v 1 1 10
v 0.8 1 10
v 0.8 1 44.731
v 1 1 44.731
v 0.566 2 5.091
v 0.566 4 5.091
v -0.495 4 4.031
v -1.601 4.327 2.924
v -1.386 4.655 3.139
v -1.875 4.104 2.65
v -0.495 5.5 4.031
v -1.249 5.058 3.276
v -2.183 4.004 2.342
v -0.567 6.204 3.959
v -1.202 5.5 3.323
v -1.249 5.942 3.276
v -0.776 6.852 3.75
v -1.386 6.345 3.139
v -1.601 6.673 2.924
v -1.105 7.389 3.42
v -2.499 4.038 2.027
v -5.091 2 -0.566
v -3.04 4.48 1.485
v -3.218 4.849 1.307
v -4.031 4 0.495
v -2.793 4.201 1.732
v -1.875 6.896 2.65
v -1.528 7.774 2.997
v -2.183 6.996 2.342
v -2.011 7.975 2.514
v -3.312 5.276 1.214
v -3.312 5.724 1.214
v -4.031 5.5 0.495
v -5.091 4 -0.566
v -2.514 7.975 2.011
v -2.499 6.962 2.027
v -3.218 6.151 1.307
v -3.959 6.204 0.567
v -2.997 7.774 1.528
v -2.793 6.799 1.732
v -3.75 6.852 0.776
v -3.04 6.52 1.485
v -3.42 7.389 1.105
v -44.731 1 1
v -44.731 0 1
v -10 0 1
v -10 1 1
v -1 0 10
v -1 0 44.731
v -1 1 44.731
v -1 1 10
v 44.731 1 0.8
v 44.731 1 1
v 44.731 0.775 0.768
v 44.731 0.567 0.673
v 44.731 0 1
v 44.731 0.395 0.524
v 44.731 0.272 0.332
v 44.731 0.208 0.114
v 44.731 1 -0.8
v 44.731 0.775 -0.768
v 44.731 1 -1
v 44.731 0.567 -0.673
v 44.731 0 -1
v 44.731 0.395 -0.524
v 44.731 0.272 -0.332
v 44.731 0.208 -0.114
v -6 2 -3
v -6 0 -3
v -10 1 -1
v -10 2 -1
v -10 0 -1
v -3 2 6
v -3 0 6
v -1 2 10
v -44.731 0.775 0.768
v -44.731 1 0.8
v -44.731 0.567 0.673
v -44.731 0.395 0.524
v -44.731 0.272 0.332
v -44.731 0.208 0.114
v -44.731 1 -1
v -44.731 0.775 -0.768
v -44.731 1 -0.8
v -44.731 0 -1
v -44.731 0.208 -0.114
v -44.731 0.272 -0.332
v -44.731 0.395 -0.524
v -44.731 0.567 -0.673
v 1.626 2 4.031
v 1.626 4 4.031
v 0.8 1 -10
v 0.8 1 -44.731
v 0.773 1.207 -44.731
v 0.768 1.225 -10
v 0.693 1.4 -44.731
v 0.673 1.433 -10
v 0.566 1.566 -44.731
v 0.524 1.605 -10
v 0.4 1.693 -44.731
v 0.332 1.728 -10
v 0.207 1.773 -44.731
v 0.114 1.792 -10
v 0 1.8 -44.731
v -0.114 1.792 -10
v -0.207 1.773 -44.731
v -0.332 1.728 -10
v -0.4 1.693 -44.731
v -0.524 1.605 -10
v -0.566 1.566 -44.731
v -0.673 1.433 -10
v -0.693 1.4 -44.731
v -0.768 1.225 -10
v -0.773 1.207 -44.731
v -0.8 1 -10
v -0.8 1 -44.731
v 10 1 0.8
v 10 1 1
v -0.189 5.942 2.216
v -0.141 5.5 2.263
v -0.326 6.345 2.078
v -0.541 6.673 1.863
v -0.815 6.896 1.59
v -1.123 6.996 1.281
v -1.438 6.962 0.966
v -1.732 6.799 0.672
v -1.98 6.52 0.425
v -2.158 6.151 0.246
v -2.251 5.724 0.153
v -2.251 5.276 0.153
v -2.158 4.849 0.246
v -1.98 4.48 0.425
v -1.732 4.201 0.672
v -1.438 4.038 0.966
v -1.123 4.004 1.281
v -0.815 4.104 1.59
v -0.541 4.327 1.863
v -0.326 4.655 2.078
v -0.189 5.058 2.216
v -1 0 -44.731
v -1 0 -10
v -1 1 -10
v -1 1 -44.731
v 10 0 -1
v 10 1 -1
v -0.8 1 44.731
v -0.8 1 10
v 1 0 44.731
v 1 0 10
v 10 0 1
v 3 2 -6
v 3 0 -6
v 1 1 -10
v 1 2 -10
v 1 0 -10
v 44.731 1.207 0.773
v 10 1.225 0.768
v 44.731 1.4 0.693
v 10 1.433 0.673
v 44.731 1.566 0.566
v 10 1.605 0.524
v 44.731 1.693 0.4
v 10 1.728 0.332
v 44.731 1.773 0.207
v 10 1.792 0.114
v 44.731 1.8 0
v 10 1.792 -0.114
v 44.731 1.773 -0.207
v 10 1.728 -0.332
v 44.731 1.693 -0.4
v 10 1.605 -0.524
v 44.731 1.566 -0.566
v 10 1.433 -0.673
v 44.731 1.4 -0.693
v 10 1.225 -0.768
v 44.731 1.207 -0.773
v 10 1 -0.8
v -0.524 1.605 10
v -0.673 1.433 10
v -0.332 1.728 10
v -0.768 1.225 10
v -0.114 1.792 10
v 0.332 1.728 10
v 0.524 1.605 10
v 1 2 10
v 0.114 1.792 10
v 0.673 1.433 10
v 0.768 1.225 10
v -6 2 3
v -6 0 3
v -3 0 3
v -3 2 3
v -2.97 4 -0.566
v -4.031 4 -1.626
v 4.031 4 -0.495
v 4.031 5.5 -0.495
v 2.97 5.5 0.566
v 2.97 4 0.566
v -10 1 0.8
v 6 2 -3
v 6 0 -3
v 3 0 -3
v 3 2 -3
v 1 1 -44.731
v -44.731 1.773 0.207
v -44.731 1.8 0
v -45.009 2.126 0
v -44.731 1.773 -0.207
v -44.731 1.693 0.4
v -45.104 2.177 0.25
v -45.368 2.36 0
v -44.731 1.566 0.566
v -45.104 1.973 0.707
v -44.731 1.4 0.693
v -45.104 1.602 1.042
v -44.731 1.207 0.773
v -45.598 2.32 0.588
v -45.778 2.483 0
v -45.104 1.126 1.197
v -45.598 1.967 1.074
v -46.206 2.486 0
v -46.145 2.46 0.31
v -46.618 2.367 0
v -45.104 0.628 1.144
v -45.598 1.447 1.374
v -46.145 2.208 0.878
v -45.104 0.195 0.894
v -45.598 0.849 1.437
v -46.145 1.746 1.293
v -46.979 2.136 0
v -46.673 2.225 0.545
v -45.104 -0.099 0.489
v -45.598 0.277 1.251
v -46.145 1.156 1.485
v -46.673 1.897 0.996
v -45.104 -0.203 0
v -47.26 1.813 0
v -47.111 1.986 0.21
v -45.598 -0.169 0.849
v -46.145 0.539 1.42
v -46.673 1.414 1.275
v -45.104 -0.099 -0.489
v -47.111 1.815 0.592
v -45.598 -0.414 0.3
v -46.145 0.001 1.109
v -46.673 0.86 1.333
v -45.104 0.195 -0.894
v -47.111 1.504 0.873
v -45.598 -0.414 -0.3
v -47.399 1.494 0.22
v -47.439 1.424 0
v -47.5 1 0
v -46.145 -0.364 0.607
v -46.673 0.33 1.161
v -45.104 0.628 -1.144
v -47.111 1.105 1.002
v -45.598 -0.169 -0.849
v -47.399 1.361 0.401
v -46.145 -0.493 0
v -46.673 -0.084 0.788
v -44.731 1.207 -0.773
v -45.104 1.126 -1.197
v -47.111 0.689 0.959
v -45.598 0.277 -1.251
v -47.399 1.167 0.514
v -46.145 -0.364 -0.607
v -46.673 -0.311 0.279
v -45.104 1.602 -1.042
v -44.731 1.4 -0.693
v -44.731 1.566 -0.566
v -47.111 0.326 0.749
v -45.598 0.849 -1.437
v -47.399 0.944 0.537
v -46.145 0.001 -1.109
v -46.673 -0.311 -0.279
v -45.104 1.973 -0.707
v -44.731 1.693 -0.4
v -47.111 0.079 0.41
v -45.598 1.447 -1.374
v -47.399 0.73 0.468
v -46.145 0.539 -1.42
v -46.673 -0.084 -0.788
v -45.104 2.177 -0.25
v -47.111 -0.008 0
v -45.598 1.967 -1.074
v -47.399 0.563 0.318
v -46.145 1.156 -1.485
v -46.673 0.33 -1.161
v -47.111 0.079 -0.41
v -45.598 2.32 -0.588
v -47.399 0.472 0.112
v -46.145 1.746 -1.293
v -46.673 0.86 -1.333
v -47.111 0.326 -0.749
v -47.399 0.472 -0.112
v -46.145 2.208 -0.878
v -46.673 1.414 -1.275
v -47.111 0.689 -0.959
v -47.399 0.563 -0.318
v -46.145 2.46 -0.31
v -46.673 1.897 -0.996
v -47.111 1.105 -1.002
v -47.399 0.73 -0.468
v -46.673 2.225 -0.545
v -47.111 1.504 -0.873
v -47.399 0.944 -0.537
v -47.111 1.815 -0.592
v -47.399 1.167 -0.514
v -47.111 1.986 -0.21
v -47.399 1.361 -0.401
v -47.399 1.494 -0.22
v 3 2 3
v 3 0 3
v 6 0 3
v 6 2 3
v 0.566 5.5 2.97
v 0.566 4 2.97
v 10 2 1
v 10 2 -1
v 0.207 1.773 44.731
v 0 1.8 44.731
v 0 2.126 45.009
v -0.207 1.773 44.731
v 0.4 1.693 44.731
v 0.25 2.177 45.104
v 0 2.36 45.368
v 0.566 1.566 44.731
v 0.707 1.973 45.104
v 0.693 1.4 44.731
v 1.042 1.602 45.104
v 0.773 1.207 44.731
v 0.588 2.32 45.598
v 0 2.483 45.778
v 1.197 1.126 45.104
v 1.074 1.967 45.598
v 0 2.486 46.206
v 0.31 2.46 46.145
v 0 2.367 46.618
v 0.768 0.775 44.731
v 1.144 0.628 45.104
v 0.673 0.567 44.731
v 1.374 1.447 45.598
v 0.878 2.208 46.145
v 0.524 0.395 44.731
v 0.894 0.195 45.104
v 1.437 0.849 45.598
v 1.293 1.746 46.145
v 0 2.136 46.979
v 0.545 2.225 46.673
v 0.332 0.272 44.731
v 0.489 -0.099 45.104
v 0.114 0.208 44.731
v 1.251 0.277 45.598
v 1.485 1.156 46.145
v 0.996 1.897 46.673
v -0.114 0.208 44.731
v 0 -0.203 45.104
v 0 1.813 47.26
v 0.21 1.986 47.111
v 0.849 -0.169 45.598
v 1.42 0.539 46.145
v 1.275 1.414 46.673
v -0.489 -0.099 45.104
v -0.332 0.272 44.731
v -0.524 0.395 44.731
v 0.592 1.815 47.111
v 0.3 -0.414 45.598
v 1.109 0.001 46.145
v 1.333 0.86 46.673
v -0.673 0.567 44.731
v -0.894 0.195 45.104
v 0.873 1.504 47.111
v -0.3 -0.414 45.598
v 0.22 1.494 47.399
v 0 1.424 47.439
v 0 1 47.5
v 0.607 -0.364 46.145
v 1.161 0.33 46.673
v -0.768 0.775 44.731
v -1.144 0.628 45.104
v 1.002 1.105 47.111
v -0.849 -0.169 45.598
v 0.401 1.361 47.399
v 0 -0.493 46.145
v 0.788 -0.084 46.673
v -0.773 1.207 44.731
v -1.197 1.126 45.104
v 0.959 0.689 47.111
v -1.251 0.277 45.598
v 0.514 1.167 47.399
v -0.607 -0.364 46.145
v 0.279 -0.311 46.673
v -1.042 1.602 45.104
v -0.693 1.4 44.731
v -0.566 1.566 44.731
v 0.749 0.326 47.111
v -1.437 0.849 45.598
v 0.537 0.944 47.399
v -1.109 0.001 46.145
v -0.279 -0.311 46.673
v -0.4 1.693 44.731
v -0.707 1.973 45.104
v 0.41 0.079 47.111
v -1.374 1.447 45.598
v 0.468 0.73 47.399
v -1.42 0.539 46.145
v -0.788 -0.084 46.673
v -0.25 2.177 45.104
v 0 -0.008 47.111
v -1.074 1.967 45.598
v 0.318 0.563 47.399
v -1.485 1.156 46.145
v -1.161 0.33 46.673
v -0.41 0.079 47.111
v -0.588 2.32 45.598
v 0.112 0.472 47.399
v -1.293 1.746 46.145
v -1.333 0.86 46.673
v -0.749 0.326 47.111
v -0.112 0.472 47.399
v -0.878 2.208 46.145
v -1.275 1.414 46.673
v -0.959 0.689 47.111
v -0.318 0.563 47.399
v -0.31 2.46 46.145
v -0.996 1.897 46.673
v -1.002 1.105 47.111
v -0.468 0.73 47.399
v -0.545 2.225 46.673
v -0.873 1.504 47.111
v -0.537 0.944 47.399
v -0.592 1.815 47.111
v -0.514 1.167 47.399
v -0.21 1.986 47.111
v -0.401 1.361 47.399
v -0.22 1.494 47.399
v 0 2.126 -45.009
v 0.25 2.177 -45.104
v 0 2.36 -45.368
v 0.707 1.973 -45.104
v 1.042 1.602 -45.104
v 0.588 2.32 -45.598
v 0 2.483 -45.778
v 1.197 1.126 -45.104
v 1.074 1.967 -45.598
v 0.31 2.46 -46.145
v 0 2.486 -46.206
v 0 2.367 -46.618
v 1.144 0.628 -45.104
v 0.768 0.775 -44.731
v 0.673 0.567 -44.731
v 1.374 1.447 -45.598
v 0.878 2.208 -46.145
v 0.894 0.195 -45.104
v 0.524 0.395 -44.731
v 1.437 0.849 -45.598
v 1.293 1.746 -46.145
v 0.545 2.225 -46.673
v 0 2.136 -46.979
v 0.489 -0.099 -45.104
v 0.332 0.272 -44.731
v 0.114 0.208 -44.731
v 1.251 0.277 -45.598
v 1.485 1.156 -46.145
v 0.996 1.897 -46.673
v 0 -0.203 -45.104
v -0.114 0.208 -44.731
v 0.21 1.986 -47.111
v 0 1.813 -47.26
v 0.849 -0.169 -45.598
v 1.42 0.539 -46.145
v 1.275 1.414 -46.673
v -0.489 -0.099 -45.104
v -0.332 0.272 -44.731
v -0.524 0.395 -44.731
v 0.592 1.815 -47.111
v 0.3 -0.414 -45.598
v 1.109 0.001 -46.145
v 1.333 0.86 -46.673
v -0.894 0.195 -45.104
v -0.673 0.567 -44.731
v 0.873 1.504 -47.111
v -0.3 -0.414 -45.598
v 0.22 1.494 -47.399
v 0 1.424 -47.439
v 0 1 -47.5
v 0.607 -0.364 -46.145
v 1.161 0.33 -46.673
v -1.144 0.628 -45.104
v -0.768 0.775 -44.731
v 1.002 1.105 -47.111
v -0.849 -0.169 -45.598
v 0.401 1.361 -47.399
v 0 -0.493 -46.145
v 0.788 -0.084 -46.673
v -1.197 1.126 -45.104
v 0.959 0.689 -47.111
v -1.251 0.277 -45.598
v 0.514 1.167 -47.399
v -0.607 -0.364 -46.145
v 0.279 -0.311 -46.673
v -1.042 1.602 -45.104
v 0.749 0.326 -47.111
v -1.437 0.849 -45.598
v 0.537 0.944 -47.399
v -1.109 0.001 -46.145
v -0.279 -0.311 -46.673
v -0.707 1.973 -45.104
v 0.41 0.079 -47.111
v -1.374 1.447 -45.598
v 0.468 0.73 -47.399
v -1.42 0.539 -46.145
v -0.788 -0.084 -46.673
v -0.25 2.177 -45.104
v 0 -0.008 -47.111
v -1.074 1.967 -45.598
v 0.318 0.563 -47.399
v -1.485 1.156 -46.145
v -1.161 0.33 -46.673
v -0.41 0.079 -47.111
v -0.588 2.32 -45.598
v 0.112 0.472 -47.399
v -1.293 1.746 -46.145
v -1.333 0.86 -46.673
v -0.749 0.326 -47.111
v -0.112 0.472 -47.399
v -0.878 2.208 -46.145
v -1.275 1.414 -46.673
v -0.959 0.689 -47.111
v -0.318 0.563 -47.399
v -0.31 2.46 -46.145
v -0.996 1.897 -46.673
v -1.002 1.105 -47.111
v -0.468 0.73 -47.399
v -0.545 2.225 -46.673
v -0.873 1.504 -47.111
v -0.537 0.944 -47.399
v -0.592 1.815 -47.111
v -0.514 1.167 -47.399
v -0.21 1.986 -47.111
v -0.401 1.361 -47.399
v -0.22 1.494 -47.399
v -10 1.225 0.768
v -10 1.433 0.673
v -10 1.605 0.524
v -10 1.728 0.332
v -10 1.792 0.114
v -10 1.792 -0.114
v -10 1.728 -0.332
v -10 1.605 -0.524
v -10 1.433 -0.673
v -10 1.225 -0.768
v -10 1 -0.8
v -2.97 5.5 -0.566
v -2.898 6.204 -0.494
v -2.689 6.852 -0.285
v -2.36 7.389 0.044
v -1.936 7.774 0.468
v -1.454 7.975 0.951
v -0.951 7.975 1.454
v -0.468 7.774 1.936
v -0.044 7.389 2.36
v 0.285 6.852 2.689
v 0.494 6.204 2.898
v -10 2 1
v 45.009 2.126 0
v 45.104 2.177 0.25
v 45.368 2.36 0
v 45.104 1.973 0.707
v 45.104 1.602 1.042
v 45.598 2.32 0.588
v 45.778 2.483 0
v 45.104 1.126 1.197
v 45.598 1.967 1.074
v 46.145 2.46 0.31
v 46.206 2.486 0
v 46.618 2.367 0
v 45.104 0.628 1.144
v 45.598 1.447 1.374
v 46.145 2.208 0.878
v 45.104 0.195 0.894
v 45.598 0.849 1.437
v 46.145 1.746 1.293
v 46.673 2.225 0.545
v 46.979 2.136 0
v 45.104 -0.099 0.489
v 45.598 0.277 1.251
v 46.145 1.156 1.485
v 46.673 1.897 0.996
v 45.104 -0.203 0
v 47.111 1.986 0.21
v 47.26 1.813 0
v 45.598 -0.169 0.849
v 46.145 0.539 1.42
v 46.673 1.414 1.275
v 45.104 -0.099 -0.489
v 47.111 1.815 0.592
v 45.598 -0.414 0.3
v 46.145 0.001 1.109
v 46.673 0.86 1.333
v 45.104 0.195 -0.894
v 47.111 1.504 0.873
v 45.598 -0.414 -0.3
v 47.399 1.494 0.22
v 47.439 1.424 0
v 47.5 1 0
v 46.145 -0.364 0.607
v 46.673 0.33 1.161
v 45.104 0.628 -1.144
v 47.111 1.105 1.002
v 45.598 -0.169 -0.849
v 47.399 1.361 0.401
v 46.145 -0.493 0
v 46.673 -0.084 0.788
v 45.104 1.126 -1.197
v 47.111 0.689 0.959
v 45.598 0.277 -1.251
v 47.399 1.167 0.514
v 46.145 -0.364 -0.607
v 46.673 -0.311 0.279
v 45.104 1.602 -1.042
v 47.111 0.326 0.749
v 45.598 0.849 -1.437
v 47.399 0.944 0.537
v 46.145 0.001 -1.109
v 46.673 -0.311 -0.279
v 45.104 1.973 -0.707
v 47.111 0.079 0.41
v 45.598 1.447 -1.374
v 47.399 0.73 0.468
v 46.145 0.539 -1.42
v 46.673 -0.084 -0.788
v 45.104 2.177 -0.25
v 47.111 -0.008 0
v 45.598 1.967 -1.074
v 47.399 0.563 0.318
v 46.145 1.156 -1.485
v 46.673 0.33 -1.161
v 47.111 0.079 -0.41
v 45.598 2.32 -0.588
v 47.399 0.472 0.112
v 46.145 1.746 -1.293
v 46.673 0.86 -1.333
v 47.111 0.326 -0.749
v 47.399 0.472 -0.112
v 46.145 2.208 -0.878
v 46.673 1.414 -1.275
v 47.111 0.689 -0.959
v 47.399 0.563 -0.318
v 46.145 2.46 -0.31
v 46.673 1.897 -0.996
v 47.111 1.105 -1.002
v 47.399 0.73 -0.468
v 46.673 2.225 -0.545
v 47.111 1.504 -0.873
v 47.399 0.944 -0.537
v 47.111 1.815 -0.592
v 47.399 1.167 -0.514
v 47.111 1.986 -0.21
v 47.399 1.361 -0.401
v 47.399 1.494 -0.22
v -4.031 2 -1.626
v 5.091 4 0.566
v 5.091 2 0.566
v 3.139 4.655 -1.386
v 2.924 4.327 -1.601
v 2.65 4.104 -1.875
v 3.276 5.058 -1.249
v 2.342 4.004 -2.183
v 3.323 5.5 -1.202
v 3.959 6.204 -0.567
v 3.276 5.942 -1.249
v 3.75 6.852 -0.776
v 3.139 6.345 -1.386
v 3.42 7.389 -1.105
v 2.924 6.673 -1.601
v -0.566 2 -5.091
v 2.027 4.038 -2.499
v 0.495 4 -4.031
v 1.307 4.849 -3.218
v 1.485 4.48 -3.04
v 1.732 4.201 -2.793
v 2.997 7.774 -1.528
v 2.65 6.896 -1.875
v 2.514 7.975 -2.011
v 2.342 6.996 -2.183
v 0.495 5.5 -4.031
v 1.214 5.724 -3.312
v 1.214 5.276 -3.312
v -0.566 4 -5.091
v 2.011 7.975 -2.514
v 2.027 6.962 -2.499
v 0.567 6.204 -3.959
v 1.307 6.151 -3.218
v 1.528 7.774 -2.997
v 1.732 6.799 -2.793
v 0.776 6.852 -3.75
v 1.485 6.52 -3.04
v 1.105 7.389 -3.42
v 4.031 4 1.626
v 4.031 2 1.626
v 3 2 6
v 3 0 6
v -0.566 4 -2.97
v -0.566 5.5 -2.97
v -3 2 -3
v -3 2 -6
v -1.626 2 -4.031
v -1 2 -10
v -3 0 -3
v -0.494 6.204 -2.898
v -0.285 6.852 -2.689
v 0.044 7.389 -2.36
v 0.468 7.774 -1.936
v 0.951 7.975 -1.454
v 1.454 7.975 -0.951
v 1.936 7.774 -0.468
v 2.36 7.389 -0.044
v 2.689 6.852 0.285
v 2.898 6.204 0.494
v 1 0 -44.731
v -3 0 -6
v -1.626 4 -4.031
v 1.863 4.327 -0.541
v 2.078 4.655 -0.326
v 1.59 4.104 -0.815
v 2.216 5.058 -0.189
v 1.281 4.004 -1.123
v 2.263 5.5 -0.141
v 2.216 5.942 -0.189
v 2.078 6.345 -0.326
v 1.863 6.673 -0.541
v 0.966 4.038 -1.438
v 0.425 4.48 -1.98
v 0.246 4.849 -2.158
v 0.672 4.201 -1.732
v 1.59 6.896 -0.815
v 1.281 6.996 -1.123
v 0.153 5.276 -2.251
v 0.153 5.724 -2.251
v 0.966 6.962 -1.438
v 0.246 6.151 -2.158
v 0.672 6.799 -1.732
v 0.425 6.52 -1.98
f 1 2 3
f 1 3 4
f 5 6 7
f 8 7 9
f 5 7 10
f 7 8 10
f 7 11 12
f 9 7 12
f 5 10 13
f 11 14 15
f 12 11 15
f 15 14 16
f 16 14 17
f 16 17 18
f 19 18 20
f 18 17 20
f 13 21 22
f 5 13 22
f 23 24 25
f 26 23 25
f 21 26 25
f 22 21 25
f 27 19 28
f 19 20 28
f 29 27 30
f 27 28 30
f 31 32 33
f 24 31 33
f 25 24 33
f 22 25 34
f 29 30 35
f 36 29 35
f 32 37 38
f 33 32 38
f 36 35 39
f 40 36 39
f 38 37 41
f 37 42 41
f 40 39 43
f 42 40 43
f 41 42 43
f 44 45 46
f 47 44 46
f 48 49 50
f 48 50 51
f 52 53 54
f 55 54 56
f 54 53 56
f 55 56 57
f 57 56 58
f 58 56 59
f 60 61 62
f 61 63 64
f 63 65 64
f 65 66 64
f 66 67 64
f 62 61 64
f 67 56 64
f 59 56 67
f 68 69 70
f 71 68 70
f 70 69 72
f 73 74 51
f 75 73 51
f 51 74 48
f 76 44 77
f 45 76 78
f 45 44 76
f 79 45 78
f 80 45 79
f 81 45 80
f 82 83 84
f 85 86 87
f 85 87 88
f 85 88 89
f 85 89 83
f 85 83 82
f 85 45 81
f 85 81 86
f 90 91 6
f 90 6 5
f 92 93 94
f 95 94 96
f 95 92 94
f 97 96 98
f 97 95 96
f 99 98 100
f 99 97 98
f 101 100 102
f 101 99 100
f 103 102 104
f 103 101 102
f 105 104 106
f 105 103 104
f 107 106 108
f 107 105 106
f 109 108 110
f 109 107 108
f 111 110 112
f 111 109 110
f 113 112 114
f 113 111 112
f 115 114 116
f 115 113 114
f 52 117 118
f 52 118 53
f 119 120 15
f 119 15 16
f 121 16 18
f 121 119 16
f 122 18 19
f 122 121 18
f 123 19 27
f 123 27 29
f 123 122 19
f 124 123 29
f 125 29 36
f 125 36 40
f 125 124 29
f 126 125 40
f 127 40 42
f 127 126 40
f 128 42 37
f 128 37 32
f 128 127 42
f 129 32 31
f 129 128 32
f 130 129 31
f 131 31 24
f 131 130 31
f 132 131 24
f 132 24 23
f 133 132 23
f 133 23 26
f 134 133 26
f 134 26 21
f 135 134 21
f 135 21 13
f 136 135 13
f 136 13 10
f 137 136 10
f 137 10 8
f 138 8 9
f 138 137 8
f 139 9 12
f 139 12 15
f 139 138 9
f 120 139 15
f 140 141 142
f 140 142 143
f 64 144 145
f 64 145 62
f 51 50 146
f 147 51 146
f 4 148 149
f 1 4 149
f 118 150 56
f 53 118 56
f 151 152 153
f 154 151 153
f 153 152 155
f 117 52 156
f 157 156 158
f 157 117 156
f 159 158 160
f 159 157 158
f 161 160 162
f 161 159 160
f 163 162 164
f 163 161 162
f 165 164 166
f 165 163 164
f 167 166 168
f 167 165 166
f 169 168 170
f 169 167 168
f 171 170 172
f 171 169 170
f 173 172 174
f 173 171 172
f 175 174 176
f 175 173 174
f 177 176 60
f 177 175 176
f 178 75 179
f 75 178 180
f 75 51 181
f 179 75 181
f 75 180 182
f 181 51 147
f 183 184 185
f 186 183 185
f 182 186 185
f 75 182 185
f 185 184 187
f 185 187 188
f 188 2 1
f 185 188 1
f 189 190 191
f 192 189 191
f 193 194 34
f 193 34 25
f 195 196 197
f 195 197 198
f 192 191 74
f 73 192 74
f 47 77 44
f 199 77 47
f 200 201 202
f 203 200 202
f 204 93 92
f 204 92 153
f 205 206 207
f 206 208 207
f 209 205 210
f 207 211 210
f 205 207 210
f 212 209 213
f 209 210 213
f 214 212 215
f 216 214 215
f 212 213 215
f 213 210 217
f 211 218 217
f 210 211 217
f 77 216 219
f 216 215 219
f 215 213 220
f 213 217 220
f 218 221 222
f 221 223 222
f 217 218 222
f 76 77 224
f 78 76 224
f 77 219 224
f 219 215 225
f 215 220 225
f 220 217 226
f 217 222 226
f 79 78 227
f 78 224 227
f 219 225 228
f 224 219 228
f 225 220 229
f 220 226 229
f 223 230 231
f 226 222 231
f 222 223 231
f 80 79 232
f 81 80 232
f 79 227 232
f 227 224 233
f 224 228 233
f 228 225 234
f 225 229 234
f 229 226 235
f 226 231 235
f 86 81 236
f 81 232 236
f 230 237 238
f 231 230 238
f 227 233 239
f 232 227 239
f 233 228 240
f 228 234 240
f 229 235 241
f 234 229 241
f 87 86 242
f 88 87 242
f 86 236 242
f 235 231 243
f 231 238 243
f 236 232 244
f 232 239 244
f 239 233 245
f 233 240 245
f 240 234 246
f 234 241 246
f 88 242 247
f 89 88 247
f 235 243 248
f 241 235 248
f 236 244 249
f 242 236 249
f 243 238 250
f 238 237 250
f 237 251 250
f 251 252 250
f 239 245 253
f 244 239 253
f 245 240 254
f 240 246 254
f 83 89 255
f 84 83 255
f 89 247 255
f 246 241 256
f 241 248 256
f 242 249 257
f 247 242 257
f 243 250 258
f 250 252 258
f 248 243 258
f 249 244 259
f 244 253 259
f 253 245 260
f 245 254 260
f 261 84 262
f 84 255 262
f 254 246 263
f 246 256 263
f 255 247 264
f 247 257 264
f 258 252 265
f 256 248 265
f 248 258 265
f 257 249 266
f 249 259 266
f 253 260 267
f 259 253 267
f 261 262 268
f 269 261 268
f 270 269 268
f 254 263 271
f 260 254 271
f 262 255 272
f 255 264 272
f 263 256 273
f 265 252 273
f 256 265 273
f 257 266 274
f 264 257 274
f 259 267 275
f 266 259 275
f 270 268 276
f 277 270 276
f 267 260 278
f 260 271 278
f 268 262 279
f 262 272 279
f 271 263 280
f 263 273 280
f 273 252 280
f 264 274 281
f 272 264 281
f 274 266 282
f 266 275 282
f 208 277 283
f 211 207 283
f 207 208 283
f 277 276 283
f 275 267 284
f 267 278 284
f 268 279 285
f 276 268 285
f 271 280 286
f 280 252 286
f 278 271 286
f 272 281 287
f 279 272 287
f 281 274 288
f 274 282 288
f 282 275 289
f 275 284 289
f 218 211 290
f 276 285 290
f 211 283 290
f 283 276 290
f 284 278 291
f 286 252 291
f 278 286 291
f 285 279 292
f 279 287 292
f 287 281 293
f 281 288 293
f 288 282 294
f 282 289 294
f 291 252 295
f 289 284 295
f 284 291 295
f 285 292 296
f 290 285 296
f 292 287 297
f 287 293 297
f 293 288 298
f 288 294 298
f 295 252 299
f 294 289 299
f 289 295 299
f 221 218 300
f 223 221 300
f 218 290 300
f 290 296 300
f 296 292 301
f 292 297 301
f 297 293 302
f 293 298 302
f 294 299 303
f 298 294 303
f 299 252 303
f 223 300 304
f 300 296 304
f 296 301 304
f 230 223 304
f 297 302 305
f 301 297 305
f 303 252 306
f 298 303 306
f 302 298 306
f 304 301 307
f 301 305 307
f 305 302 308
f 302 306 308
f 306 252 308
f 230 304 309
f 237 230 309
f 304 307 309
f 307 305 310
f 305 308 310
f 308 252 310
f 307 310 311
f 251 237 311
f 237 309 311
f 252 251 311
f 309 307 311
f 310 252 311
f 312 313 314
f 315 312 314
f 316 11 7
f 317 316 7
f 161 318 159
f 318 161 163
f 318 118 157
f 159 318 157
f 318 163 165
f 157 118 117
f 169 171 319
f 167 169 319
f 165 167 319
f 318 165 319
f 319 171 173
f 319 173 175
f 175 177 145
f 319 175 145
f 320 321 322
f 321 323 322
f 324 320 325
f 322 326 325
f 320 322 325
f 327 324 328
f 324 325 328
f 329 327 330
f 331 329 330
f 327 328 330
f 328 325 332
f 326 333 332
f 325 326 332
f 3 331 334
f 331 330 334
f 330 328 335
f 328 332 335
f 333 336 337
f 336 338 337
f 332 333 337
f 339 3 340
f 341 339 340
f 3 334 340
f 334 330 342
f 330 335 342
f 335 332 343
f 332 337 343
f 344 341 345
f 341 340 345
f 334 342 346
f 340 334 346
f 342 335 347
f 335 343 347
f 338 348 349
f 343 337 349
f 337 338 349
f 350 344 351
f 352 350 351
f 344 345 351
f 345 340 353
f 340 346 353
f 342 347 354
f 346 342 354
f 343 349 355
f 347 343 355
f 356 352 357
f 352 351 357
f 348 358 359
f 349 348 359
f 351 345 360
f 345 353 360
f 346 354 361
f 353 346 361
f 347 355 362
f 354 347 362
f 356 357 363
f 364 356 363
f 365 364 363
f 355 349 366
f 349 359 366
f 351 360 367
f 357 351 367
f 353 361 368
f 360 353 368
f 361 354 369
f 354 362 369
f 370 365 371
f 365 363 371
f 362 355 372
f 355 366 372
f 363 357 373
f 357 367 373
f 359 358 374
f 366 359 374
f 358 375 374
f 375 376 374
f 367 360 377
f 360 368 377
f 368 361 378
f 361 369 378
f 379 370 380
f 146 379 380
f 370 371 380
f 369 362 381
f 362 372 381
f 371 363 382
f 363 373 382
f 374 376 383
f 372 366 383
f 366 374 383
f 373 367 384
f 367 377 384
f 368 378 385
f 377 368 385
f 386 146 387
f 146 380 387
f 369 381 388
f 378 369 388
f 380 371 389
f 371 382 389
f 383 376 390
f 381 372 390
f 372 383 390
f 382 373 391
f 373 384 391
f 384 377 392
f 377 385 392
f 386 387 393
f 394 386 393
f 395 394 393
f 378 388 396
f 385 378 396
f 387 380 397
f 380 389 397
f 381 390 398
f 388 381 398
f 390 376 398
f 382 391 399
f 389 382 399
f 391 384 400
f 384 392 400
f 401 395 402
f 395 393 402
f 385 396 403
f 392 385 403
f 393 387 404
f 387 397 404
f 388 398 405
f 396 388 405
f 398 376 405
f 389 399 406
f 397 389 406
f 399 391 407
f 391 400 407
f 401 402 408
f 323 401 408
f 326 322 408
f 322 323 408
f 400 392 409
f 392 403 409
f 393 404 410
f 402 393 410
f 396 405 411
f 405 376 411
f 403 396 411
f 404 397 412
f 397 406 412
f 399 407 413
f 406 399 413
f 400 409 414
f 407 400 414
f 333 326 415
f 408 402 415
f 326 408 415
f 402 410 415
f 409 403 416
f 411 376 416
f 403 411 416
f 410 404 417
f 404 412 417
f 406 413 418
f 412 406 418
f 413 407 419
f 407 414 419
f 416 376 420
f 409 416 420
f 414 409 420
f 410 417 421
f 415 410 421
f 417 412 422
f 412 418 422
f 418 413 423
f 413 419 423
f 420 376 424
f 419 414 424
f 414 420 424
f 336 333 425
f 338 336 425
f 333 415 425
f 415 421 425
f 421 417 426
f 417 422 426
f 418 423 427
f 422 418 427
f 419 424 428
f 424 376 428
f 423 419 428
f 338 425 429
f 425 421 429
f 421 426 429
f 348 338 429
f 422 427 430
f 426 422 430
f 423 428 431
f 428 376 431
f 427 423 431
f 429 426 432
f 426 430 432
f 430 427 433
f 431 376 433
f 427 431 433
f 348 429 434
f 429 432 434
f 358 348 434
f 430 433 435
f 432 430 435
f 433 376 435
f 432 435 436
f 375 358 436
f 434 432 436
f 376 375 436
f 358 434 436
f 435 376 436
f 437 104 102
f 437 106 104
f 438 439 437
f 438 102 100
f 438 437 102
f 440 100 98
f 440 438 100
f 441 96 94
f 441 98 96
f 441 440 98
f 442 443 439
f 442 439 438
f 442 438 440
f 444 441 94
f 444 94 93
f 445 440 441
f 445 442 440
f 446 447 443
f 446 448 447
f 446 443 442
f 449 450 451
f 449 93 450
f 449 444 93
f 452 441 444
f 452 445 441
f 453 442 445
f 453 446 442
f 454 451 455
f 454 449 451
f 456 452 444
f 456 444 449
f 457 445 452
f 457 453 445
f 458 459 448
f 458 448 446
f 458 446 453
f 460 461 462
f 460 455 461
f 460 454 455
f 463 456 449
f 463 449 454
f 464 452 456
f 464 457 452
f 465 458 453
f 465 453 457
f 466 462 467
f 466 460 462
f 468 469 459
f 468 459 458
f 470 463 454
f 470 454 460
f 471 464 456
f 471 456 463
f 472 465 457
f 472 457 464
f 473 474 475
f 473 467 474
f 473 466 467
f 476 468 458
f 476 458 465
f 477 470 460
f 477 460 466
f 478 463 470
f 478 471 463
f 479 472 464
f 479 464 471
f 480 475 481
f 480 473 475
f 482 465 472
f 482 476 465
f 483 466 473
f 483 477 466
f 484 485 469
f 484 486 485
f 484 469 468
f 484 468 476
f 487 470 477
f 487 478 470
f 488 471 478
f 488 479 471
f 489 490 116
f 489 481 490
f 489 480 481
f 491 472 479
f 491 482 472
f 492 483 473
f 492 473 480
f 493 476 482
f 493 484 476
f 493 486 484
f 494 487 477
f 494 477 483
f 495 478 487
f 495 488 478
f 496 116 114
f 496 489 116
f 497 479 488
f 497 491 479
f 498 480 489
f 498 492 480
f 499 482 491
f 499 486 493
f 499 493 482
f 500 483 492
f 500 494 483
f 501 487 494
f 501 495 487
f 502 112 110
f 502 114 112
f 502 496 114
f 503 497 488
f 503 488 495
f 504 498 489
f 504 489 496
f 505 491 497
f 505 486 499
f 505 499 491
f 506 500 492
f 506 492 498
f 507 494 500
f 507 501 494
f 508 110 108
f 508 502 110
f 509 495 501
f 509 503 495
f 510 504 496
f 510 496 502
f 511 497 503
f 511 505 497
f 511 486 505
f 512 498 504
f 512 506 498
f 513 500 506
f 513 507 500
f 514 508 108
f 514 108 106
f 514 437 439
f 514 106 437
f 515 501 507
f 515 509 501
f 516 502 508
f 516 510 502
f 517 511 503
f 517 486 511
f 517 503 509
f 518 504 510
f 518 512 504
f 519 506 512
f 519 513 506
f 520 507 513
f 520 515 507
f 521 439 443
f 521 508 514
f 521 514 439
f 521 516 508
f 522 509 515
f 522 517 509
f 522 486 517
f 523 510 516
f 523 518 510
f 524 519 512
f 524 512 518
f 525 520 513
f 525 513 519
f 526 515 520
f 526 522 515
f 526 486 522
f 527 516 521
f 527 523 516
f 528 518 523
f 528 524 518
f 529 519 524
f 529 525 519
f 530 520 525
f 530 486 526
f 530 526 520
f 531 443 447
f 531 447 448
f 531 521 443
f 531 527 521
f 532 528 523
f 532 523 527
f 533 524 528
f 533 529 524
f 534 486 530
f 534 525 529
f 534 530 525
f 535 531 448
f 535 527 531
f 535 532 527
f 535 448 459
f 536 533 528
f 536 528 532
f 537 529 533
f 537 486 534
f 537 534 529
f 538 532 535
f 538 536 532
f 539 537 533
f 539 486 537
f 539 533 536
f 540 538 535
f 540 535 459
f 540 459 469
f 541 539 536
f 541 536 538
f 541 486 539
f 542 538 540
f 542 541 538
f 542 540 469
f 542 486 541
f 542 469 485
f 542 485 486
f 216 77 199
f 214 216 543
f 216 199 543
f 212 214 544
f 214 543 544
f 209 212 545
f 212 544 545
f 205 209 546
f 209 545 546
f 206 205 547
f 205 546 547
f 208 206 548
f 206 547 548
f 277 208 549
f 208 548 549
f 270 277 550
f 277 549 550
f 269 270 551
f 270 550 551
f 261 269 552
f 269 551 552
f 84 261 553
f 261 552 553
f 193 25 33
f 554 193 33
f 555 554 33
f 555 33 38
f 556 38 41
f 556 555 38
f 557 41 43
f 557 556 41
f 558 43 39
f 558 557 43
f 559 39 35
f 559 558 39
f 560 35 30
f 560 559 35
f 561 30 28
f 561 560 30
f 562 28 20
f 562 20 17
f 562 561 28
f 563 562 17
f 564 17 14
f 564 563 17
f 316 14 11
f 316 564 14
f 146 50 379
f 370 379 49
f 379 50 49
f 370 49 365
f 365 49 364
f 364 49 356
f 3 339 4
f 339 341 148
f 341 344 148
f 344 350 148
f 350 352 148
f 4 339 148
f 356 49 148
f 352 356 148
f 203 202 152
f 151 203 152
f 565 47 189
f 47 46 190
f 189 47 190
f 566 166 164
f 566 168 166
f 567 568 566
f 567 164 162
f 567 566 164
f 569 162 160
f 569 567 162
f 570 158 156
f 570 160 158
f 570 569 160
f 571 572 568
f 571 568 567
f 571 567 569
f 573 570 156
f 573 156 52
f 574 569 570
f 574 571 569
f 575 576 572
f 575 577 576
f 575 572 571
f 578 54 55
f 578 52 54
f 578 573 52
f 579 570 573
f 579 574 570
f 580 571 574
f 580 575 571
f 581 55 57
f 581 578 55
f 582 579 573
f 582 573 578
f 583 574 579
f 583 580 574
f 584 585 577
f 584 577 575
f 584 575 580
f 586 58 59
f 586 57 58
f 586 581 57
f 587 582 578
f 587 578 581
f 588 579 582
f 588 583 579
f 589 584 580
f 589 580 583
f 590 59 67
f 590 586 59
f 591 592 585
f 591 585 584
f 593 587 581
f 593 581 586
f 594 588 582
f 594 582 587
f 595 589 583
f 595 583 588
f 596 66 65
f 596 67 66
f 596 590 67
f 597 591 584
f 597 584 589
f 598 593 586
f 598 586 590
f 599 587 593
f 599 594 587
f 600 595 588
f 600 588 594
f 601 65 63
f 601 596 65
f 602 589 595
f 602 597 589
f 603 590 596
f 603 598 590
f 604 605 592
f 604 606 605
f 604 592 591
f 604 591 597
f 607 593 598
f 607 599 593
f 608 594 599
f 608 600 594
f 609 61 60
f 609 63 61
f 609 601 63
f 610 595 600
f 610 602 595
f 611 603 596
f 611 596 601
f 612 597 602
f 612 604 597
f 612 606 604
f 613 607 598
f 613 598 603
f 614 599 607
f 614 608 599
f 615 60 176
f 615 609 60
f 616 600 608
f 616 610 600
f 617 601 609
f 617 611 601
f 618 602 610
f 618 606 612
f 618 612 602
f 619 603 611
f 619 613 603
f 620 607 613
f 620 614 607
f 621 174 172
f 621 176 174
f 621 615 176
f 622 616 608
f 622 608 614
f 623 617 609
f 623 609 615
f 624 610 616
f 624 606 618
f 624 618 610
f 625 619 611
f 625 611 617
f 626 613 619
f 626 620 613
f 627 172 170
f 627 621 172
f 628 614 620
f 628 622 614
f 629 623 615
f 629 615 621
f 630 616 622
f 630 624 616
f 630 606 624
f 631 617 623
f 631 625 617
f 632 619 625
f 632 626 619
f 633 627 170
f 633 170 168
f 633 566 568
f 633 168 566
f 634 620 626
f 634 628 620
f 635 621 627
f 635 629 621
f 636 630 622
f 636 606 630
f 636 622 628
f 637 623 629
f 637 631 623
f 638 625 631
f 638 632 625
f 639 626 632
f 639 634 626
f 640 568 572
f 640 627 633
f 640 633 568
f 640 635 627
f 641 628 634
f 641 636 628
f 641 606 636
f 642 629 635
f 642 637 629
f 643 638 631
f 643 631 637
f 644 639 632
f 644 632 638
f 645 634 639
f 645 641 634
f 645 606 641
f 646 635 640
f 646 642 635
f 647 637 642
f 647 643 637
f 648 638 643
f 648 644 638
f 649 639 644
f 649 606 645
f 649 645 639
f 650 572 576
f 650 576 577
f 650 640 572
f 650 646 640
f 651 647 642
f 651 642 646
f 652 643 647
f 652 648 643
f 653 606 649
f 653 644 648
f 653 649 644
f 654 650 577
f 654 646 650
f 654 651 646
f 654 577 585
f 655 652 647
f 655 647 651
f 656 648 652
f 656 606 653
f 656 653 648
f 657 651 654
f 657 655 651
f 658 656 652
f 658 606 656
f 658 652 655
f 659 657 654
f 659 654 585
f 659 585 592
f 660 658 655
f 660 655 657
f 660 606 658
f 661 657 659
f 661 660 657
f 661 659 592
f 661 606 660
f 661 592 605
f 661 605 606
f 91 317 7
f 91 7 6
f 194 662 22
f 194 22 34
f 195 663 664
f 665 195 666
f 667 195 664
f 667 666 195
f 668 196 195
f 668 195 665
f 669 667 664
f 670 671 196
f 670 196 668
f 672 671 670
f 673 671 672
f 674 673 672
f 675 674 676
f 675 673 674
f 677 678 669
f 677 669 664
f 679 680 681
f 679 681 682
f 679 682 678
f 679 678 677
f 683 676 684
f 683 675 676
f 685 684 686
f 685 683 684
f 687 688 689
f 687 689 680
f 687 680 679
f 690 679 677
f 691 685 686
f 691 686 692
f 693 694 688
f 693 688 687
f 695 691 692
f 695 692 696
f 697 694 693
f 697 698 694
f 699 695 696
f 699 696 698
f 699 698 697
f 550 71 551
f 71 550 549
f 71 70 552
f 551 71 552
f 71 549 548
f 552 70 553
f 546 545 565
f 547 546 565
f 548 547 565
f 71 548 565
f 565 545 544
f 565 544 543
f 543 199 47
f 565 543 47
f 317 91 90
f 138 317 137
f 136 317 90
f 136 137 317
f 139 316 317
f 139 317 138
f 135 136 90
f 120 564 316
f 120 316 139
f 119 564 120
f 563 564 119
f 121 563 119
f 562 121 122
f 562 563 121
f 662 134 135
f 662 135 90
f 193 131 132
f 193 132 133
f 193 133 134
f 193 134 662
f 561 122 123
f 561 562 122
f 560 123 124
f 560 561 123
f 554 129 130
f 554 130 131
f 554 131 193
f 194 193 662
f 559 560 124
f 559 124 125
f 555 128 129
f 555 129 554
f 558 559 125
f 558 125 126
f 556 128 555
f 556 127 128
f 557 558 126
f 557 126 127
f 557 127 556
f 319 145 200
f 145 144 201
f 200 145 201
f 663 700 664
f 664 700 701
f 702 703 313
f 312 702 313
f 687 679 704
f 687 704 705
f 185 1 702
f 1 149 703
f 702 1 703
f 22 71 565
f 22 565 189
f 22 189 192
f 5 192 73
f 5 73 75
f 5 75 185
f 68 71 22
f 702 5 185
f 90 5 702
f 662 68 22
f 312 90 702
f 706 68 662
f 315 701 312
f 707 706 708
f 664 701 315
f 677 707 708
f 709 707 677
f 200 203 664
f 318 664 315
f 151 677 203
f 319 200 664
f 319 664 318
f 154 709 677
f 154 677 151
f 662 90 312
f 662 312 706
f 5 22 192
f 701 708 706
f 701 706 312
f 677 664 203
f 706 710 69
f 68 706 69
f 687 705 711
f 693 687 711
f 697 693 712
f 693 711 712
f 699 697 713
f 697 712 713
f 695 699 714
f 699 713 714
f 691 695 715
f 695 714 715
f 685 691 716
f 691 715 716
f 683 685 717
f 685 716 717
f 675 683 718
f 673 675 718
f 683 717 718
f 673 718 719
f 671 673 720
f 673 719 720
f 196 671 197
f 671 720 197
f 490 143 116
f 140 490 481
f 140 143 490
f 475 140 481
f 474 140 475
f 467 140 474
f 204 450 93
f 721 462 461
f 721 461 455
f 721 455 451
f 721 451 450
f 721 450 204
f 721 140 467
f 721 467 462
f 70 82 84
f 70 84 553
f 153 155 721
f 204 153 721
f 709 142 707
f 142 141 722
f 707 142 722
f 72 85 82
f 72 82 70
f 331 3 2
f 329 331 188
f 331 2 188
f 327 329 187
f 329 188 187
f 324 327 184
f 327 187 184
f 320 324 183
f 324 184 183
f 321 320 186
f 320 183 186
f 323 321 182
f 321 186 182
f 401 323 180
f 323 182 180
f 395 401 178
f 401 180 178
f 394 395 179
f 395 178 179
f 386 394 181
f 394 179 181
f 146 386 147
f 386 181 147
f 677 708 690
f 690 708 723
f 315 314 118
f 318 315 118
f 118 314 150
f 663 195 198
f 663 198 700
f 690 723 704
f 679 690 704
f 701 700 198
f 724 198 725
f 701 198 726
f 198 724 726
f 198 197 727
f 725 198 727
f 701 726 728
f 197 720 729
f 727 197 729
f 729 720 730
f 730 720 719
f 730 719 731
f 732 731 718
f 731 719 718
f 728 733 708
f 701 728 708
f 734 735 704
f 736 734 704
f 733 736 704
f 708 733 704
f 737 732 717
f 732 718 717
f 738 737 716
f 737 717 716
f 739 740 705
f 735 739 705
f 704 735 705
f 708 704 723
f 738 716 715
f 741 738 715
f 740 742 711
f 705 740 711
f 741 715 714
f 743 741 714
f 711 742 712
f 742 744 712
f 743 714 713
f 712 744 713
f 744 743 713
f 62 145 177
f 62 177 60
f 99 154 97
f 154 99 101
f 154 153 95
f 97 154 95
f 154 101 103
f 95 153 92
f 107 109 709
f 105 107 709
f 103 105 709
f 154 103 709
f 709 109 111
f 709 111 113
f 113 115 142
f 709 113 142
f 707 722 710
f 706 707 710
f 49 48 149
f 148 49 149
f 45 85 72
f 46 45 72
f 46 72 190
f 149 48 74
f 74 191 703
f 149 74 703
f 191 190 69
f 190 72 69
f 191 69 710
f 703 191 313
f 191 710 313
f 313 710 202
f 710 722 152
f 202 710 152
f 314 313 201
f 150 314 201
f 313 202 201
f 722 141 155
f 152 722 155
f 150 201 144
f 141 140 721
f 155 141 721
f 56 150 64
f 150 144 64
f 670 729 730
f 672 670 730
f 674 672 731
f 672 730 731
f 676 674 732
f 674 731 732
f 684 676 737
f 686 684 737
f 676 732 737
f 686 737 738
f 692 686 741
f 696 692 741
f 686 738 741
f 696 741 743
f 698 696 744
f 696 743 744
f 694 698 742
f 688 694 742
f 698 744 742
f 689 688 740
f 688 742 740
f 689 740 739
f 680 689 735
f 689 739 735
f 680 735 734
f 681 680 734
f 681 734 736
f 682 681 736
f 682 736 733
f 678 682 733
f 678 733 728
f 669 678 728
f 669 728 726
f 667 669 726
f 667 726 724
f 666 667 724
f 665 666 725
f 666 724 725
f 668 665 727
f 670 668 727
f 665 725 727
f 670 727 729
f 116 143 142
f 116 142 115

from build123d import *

# Parameters (mm, degrees)
EXTRUDE_1_DEPTH     = 2
SKETCH_2_R          = 0.8
CUT_EXTRUDE_1_DEPTH = 4
SKETCH_3_R          = 0.8
CUT_EXTRUDE_2_DEPTH = 4
SKETCH_4_R          = 0.8
CUT_EXTRUDE_3_DEPTH = 4
SKETCH_5_R          = 0.8
CUT_EXTRUDE_4_DEPTH = 4
SKETCH_9_R          = 1.5
EXTRUDE_2_DEPTH     = 1.5
SKETCH_10_R         = 0.8
EXTRUDE_3_DEPTH     = 40
SKETCH_11_R         = 0.8
EXTRUDE_4_DEPTH     = 40
SKETCH_15_W         = 2
SKETCH_15_H         = 34.731142246
SKETCH_15_W_2       = 34.731142246
SKETCH_15_H_2       = 2
EXTRUDE_6_DEPTH     = 1


with BuildPart() as part:
    # 草图1 → 凸台-拉伸1 (new body)
    with BuildSketch(Plane(origin=(0, 0, 0), x_dir=(1, 0, 0), z_dir=(0, 1, 0))):
        Polygon((3, -3), (6, -3), (10, -1), (10, 1), (6, 3), (3, 3), (3, 6), (1, 10), (-1, 10), (-3, 6), (-3, 3), (-6, 3), (-10, 1), (-10, -1), (-6, -3), (-3, -3), (-3, -6), (-1, -10), (1, -10), (3, -6), align=None)
    extrude(amount=EXTRUDE_1_DEPTH)

    # 草图2 → 切除-拉伸1 (cut)
    with BuildSketch(Plane.XY.offset(10)):
        with Locations((0, 1)):
            Circle(SKETCH_2_R)
    extrude(amount=-CUT_EXTRUDE_1_DEPTH, mode=Mode.SUBTRACT)

    # 草图3 → 切除-拉伸2 (cut)
    with BuildSketch(Plane(origin=(10, 0, 0), x_dir=(0, 0, -1), z_dir=(1, 0, 0))):
        with Locations((0, 1)):
            Circle(SKETCH_3_R)
    extrude(amount=-CUT_EXTRUDE_2_DEPTH, mode=Mode.SUBTRACT)

    # 草图4 → 切除-拉伸3 (cut)
    with BuildSketch(Plane(origin=(0, 0, -10), x_dir=(-1, 0, 0), z_dir=(0, 0, -1))):
        with Locations((0, 1)):
            Circle(SKETCH_4_R)
    extrude(amount=-CUT_EXTRUDE_3_DEPTH, mode=Mode.SUBTRACT)

    # 草图5 → 切除-拉伸4 (cut)
    with BuildSketch(Plane.ZY.offset(10)):
        with Locations((0, 1)):
            Circle(SKETCH_5_R)
    extrude(amount=-CUT_EXTRUDE_4_DEPTH, mode=Mode.SUBTRACT)

    # 草图9 → 凸台-拉伸2 (add)
    with BuildSketch(Plane(origin=(-1.202081528, 0, 1.202081528), x_dir=(0.707106781, 0, 0.707106781), z_dir=(-0.707106781, 0, 0.707106781))):
        with BuildLine():
            Line((2.5, 5.5), (2.5, 4))
            Line((2.5, 4), (4, 4))
            Line((4, 4), (4, 2))
            Line((4, 2), (-4, 2))
            Line((-4, 2), (-4, 4))
            Line((-4, 4), (-2.5, 4))
            Line((-2.5, 4), (-2.5, 5.5))
            ThreePointArc((-2.5, 5.5), (0, 8), (2.5, 5.5))
        make_face()
        with Locations((0, 5.5)):
            Circle(SKETCH_9_R, mode=Mode.SUBTRACT)
    extrude_2 = extrude(amount=EXTRUDE_2_DEPTH)

    # 镜向1: 凸台-拉伸2 across plane
    add(extrude_2.mirror(Plane(origin=(0, 0, 0), x_dir=(0.707106781, 0, 0.707106781), z_dir=(-0.707106781, 0, 0.707106781))))

    # 草图10 → 凸台-拉伸3 (add)
    with BuildSketch(Plane.ZY.offset(6)):
        with Locations((0, 1)):
            Circle(SKETCH_10_R)
    extrude_3 = extrude(amount=EXTRUDE_3_DEPTH)

    # 草图11 → 凸台-拉伸4 (add)
    with BuildSketch(Plane.XY.offset(6)):
        with Locations((0, 1)):
            Circle(SKETCH_11_R)
    extrude_4 = extrude(amount=EXTRUDE_4_DEPTH)

    # 镜向2: 凸台-拉伸4 across plane
    add(extrude_4.mirror(Plane.XY))

    # 镜向3: 凸台-拉伸3 across plane
    add(extrude_3.mirror(Plane(origin=(0, 0, 0), x_dir=(0, 0, 1), z_dir=(1, 0, 0))))

    # 草图12 → 旋转1 (revolve)
    with BuildSketch(Plane(origin=(0, 0, 0), x_dir=(0, 0, -1), z_dir=(1, 0, 0))):
        with BuildLine():
            Line((-47.5, 1), (-44.5, 1))
            ThreePointArc((-44.5, 1), (-46, 2.5), (-47.5, 1))
        make_face()
    revolve_1 = revolve(axis=Axis((0, 1, 47.5), (0, 0, -1)))

    # 草图14 → 旋转2 (revolve)
    with BuildSketch(Plane.XY):
        with BuildLine():
            Line((-47.5, 1), (-44.5, 1))
            ThreePointArc((-44.5, 1), (-46, 2.5), (-47.5, 1))
        make_face()
    revolve_2 = revolve(axis=Axis((-47.5, 1, 0), (1, 0, 0)))

    # 镜向4: 旋转1 across plane
    add(revolve_1.mirror(Plane.XY))

    # 镜向5: 旋转2 across plane
    add(revolve_2.mirror(Plane(origin=(0, 0, 0), x_dir=(0, 0, 1), z_dir=(1, 0, 0))))

    # 草图15 → 凸台-拉伸6 (add)
    with BuildSketch(Plane(origin=(0, 0, 0), x_dir=(1, 0, 0), z_dir=(0, 1, 0))):
        with Locations((0, 27.365571123)):
            Rectangle(SKETCH_15_W, SKETCH_15_H)
        with Locations((27.365571123, 0)):
            Rectangle(SKETCH_15_W_2, SKETCH_15_H_2)
        with Locations((0, -27.365571123)):
            Rectangle(SKETCH_15_W, SKETCH_15_H)
        with Locations((-27.365571123, 0)):
            Rectangle(SKETCH_15_W_2, SKETCH_15_H_2)
    extrude(amount=EXTRUDE_6_DEPTH)


solid = part.part
